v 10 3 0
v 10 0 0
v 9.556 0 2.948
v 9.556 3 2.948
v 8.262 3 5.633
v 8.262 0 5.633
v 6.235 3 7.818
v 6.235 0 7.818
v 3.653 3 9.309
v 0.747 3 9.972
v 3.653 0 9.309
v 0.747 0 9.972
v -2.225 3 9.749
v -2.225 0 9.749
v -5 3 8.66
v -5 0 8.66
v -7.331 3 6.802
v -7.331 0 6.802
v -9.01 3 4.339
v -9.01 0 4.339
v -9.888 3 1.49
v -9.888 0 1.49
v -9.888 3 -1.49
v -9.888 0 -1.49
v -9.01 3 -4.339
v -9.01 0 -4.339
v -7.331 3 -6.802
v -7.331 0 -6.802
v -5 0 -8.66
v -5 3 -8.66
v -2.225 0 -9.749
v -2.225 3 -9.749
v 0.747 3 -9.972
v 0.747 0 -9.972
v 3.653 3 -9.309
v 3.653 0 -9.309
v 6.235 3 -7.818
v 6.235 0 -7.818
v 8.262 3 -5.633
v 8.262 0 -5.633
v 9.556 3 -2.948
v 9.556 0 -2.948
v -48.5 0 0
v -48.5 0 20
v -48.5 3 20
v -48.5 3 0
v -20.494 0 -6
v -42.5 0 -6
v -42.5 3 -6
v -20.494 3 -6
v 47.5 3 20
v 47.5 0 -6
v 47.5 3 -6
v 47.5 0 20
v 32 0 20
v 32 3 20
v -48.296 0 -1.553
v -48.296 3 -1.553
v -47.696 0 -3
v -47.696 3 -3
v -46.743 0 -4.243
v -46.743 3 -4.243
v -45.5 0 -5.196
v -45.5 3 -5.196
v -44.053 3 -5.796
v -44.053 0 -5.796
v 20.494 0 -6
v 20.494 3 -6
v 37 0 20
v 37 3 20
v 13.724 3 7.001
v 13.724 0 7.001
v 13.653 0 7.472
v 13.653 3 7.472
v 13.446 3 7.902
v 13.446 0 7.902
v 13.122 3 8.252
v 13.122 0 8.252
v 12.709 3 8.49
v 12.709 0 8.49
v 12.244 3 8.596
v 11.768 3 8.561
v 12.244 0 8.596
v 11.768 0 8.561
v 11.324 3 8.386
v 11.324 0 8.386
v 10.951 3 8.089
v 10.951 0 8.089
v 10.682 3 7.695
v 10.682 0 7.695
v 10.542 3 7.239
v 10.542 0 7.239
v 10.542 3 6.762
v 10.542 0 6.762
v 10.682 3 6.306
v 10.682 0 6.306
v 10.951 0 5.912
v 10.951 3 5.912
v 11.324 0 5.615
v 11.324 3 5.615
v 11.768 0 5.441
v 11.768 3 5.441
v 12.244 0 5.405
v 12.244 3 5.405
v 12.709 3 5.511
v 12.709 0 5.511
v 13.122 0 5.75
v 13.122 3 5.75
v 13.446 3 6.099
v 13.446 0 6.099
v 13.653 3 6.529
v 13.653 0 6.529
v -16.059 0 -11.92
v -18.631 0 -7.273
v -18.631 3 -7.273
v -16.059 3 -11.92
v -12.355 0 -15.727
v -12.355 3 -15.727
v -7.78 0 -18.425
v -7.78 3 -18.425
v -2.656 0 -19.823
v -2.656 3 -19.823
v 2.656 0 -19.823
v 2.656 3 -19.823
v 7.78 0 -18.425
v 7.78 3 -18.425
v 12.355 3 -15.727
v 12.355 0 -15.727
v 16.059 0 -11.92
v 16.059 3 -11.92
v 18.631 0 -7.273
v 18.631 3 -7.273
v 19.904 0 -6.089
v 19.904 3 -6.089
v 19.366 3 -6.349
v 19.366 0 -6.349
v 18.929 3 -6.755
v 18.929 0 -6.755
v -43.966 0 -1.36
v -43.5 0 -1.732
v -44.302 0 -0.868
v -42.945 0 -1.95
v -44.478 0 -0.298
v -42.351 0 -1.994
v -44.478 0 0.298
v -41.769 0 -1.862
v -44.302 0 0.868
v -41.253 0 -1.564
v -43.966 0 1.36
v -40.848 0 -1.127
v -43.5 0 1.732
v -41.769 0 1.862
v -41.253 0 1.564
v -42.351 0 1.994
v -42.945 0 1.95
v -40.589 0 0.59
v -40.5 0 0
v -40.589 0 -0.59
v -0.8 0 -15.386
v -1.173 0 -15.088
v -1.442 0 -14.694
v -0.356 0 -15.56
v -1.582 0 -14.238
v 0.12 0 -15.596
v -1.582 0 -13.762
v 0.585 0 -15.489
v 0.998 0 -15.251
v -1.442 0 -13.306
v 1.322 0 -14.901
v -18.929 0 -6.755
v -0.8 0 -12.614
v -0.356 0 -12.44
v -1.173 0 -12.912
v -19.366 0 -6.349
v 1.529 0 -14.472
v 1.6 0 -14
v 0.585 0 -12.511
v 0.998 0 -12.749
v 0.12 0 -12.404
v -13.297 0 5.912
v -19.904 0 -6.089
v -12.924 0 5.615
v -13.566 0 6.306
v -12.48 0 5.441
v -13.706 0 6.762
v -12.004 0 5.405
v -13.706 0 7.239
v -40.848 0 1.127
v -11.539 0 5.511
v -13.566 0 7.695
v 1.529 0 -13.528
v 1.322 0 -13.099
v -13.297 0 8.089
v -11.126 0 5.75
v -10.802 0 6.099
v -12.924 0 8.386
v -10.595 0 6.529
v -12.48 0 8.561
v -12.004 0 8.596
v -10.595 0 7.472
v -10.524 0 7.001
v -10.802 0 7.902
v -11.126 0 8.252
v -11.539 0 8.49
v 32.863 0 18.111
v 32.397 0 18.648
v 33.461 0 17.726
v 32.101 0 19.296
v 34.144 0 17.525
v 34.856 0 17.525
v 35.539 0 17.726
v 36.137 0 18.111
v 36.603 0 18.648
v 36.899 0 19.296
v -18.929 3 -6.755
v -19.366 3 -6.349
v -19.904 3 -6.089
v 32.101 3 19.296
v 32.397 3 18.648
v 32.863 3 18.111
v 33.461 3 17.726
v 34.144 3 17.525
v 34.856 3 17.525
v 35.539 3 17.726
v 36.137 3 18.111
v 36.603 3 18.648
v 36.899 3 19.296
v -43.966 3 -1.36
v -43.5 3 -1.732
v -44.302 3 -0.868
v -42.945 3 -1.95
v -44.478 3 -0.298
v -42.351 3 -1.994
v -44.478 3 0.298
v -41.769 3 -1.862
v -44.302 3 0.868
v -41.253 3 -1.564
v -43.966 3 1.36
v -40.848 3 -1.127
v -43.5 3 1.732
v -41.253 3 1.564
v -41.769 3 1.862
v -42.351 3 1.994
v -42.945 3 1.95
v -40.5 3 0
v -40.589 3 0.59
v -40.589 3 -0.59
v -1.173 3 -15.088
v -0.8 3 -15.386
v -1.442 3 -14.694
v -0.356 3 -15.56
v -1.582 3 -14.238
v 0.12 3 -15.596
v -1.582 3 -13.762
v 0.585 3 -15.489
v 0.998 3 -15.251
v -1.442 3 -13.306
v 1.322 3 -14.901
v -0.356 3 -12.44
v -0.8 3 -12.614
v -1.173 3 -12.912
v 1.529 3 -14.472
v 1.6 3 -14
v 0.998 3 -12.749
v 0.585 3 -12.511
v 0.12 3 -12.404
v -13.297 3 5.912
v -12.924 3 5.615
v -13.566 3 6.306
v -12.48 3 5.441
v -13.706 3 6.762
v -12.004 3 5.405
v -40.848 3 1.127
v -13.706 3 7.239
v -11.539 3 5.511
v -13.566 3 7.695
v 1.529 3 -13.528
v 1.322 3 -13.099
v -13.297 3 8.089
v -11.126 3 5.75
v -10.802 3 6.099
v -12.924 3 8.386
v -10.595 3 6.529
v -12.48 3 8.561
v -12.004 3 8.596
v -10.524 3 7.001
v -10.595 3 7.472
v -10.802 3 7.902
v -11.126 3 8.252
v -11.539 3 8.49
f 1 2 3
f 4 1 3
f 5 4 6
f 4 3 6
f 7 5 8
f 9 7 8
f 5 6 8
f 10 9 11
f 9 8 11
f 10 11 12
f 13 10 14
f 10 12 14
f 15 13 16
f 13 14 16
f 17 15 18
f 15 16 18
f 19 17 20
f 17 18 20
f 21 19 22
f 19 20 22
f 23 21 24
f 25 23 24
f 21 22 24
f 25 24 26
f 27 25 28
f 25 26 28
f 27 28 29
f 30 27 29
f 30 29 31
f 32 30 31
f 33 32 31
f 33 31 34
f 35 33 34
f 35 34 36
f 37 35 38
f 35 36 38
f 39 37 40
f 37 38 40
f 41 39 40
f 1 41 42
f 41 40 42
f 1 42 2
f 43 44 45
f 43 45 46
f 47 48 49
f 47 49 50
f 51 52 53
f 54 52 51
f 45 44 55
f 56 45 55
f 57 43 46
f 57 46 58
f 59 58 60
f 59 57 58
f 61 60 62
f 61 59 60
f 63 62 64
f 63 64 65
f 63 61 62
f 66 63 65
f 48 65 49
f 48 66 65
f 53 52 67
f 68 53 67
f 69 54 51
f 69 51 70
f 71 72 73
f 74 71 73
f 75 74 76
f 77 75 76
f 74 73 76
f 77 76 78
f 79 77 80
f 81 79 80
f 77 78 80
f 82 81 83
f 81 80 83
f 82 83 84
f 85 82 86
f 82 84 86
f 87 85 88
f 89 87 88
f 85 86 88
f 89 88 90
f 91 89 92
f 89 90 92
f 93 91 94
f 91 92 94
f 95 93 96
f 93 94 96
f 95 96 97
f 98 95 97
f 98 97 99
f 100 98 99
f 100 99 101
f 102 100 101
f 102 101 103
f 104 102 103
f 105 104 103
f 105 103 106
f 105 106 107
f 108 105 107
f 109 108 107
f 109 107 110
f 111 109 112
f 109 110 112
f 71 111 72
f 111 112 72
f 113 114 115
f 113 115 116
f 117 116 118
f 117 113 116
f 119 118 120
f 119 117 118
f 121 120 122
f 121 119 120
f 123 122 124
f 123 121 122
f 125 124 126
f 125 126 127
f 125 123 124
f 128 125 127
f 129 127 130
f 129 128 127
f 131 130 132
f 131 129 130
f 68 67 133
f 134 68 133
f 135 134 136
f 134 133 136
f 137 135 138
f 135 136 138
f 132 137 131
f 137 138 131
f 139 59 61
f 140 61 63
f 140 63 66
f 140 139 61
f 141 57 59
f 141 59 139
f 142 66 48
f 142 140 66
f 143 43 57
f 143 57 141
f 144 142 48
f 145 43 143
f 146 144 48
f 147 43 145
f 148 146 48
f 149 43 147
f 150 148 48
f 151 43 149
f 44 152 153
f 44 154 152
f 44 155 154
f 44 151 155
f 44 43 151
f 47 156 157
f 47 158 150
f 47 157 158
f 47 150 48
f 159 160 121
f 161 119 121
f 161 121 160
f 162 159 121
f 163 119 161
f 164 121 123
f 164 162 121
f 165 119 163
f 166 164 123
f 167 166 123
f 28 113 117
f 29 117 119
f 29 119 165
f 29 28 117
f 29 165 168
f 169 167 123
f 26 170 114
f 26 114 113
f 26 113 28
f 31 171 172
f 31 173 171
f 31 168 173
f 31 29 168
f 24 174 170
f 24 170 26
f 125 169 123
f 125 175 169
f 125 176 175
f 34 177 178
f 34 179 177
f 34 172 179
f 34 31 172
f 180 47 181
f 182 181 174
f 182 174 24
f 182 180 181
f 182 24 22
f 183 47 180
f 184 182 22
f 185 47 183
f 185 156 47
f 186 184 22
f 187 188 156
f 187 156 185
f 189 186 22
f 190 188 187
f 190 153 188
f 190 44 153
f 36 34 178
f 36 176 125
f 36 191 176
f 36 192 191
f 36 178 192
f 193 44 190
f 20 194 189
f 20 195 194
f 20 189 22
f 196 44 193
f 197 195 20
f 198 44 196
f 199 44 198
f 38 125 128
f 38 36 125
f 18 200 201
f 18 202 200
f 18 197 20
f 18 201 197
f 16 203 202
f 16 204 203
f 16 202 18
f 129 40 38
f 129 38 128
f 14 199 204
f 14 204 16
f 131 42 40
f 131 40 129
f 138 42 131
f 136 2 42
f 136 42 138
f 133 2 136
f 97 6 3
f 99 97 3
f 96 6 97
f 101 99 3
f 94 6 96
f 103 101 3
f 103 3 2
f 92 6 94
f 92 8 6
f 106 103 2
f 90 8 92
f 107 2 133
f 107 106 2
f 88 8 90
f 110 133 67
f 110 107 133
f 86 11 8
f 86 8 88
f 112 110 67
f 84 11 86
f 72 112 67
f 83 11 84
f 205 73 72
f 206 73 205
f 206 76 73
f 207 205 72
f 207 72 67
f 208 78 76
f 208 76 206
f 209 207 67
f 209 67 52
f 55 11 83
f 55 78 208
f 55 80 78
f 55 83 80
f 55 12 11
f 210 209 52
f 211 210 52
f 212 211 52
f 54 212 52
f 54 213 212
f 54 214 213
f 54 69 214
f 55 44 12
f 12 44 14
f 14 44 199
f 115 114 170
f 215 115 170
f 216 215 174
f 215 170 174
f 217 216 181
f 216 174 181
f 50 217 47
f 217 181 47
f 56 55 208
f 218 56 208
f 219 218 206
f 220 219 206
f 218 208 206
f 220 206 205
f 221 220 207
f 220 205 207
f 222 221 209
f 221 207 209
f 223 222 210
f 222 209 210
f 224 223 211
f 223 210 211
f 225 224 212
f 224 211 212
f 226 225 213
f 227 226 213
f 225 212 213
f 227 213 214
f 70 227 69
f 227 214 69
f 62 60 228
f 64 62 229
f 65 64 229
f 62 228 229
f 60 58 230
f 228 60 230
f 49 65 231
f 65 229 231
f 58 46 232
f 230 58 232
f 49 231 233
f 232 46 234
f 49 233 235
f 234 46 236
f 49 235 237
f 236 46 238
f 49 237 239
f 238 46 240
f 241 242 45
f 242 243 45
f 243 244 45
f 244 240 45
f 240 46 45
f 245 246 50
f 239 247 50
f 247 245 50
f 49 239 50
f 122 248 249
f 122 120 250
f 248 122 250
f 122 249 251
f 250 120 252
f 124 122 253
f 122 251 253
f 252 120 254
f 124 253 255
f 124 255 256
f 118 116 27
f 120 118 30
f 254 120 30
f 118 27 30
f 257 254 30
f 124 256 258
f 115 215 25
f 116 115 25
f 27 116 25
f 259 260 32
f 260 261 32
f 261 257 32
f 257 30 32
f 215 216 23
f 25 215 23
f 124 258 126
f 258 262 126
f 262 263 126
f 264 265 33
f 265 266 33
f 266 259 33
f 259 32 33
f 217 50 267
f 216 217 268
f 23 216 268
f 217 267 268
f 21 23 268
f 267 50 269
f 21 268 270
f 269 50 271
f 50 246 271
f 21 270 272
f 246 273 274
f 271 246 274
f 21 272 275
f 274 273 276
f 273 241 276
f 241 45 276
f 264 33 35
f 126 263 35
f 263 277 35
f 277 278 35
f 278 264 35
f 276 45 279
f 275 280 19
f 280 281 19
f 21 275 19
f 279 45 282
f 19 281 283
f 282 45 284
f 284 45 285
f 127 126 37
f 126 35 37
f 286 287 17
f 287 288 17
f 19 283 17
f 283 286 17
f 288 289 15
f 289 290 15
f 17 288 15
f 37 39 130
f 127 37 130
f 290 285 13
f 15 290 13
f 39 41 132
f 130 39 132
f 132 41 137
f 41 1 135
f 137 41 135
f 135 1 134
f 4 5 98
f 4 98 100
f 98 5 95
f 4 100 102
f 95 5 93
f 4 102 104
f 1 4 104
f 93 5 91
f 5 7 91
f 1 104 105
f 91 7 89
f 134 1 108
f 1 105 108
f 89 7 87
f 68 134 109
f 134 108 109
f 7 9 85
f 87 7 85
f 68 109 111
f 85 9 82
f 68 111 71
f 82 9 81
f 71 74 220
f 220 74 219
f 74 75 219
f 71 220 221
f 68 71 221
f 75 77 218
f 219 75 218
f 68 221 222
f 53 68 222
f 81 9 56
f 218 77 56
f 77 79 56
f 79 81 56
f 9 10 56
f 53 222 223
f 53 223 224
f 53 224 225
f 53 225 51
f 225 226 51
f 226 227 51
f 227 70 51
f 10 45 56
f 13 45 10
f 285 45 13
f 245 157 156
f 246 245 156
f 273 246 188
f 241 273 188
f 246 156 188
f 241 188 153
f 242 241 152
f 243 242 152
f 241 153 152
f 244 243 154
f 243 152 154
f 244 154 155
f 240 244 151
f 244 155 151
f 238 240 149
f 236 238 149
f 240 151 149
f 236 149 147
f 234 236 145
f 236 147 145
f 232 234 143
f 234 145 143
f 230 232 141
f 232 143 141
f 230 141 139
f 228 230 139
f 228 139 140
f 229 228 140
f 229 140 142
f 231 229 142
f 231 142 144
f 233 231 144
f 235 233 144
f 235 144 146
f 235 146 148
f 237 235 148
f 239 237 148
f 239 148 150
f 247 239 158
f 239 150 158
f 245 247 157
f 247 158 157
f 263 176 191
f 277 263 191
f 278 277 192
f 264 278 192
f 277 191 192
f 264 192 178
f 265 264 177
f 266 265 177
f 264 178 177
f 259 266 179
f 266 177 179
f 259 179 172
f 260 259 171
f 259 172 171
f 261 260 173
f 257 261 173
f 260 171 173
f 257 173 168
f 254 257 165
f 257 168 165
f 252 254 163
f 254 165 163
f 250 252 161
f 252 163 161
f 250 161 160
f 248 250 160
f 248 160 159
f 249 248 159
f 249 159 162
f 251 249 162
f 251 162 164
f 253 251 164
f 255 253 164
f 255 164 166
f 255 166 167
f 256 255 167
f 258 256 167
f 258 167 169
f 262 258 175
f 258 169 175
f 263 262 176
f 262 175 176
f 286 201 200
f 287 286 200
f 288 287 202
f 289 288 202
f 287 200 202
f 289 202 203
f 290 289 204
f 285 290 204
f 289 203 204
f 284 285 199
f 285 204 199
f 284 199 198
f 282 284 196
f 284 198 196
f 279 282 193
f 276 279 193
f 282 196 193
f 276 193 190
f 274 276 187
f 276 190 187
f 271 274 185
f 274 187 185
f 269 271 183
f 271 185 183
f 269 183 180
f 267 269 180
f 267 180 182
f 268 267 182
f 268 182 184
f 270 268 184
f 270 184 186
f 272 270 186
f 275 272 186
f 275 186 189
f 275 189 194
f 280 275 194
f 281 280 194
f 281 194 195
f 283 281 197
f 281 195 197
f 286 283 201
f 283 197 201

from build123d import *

# Parameters (mm, degrees)
SKETCH_AS_DRAWN_R                 = 2
SKETCH_AS_DRAWN_R_2               = 10
SKETCH_AS_DRAWN_R_3               = 1.6
EXTRUDE001_DEPTH                  = 3
EXTRUDE001_ONTO_SKETCH_ROLL_ANGLE = 90


with BuildPart() as part:
    # Sketch as drawn → Extrude001 (new)
    with BuildSketch(Plane.XY):
        with BuildLine():
            ThreePointArc((-48.5, 0), (-46.742641, -4.242641), (-42.5, -6))
            Line((-42.5, -6), (-20.493903, -6))
            ThreePointArc((-18.63082, -7.272727), (-19.36575, -6.348554), (-20.493903, -6))
            ThreePointArc((-18.63082, -7.272727), (0, -20), (18.63082, -7.272727))
            ThreePointArc((20.493902, -6), (19.365749, -6.348554), (18.63082, -7.272727))
            Line((47.5, -6), (20.493902, -6))
            Line((47.5, -6), (47.5, 20))
            Line((47.5, 20), (37, 20))
            ThreePointArc((32, 20), (34.5, 17.5), (37, 20))
            Line((-48.5, 20), (32, 20))
            Line((-48.5, 20), (-48.5, 0))
        make_face()
        with Locations((-42.5, 0)):
            Circle(SKETCH_AS_DRAWN_R, mode=Mode.SUBTRACT)
        Circle(SKETCH_AS_DRAWN_R_2, mode=Mode.SUBTRACT)
        with Locations((-12.124, 7.000616)):
            Circle(SKETCH_AS_DRAWN_R_3, mode=Mode.SUBTRACT)
        with Locations((0, -14)):
            Circle(SKETCH_AS_DRAWN_R_3, mode=Mode.SUBTRACT)
        with Locations((12.124, 7.000616)):
            Circle(SKETCH_AS_DRAWN_R_3, mode=Mode.SUBTRACT)
    extrude(amount=-EXTRUDE001_DEPTH)


with BuildPart() as part_1:
    # Extrude001 onto Sketch roll: moved
    add(part.part.rotate(Axis((0, 0, 0), (1, 0, 0)), EXTRUDE001_ONTO_SKETCH_ROLL_ANGLE))


with BuildPart() as part_2:
    # Extrude001 onto Sketch placement: moved
    add(part_1.part)


solid = part_2.part
